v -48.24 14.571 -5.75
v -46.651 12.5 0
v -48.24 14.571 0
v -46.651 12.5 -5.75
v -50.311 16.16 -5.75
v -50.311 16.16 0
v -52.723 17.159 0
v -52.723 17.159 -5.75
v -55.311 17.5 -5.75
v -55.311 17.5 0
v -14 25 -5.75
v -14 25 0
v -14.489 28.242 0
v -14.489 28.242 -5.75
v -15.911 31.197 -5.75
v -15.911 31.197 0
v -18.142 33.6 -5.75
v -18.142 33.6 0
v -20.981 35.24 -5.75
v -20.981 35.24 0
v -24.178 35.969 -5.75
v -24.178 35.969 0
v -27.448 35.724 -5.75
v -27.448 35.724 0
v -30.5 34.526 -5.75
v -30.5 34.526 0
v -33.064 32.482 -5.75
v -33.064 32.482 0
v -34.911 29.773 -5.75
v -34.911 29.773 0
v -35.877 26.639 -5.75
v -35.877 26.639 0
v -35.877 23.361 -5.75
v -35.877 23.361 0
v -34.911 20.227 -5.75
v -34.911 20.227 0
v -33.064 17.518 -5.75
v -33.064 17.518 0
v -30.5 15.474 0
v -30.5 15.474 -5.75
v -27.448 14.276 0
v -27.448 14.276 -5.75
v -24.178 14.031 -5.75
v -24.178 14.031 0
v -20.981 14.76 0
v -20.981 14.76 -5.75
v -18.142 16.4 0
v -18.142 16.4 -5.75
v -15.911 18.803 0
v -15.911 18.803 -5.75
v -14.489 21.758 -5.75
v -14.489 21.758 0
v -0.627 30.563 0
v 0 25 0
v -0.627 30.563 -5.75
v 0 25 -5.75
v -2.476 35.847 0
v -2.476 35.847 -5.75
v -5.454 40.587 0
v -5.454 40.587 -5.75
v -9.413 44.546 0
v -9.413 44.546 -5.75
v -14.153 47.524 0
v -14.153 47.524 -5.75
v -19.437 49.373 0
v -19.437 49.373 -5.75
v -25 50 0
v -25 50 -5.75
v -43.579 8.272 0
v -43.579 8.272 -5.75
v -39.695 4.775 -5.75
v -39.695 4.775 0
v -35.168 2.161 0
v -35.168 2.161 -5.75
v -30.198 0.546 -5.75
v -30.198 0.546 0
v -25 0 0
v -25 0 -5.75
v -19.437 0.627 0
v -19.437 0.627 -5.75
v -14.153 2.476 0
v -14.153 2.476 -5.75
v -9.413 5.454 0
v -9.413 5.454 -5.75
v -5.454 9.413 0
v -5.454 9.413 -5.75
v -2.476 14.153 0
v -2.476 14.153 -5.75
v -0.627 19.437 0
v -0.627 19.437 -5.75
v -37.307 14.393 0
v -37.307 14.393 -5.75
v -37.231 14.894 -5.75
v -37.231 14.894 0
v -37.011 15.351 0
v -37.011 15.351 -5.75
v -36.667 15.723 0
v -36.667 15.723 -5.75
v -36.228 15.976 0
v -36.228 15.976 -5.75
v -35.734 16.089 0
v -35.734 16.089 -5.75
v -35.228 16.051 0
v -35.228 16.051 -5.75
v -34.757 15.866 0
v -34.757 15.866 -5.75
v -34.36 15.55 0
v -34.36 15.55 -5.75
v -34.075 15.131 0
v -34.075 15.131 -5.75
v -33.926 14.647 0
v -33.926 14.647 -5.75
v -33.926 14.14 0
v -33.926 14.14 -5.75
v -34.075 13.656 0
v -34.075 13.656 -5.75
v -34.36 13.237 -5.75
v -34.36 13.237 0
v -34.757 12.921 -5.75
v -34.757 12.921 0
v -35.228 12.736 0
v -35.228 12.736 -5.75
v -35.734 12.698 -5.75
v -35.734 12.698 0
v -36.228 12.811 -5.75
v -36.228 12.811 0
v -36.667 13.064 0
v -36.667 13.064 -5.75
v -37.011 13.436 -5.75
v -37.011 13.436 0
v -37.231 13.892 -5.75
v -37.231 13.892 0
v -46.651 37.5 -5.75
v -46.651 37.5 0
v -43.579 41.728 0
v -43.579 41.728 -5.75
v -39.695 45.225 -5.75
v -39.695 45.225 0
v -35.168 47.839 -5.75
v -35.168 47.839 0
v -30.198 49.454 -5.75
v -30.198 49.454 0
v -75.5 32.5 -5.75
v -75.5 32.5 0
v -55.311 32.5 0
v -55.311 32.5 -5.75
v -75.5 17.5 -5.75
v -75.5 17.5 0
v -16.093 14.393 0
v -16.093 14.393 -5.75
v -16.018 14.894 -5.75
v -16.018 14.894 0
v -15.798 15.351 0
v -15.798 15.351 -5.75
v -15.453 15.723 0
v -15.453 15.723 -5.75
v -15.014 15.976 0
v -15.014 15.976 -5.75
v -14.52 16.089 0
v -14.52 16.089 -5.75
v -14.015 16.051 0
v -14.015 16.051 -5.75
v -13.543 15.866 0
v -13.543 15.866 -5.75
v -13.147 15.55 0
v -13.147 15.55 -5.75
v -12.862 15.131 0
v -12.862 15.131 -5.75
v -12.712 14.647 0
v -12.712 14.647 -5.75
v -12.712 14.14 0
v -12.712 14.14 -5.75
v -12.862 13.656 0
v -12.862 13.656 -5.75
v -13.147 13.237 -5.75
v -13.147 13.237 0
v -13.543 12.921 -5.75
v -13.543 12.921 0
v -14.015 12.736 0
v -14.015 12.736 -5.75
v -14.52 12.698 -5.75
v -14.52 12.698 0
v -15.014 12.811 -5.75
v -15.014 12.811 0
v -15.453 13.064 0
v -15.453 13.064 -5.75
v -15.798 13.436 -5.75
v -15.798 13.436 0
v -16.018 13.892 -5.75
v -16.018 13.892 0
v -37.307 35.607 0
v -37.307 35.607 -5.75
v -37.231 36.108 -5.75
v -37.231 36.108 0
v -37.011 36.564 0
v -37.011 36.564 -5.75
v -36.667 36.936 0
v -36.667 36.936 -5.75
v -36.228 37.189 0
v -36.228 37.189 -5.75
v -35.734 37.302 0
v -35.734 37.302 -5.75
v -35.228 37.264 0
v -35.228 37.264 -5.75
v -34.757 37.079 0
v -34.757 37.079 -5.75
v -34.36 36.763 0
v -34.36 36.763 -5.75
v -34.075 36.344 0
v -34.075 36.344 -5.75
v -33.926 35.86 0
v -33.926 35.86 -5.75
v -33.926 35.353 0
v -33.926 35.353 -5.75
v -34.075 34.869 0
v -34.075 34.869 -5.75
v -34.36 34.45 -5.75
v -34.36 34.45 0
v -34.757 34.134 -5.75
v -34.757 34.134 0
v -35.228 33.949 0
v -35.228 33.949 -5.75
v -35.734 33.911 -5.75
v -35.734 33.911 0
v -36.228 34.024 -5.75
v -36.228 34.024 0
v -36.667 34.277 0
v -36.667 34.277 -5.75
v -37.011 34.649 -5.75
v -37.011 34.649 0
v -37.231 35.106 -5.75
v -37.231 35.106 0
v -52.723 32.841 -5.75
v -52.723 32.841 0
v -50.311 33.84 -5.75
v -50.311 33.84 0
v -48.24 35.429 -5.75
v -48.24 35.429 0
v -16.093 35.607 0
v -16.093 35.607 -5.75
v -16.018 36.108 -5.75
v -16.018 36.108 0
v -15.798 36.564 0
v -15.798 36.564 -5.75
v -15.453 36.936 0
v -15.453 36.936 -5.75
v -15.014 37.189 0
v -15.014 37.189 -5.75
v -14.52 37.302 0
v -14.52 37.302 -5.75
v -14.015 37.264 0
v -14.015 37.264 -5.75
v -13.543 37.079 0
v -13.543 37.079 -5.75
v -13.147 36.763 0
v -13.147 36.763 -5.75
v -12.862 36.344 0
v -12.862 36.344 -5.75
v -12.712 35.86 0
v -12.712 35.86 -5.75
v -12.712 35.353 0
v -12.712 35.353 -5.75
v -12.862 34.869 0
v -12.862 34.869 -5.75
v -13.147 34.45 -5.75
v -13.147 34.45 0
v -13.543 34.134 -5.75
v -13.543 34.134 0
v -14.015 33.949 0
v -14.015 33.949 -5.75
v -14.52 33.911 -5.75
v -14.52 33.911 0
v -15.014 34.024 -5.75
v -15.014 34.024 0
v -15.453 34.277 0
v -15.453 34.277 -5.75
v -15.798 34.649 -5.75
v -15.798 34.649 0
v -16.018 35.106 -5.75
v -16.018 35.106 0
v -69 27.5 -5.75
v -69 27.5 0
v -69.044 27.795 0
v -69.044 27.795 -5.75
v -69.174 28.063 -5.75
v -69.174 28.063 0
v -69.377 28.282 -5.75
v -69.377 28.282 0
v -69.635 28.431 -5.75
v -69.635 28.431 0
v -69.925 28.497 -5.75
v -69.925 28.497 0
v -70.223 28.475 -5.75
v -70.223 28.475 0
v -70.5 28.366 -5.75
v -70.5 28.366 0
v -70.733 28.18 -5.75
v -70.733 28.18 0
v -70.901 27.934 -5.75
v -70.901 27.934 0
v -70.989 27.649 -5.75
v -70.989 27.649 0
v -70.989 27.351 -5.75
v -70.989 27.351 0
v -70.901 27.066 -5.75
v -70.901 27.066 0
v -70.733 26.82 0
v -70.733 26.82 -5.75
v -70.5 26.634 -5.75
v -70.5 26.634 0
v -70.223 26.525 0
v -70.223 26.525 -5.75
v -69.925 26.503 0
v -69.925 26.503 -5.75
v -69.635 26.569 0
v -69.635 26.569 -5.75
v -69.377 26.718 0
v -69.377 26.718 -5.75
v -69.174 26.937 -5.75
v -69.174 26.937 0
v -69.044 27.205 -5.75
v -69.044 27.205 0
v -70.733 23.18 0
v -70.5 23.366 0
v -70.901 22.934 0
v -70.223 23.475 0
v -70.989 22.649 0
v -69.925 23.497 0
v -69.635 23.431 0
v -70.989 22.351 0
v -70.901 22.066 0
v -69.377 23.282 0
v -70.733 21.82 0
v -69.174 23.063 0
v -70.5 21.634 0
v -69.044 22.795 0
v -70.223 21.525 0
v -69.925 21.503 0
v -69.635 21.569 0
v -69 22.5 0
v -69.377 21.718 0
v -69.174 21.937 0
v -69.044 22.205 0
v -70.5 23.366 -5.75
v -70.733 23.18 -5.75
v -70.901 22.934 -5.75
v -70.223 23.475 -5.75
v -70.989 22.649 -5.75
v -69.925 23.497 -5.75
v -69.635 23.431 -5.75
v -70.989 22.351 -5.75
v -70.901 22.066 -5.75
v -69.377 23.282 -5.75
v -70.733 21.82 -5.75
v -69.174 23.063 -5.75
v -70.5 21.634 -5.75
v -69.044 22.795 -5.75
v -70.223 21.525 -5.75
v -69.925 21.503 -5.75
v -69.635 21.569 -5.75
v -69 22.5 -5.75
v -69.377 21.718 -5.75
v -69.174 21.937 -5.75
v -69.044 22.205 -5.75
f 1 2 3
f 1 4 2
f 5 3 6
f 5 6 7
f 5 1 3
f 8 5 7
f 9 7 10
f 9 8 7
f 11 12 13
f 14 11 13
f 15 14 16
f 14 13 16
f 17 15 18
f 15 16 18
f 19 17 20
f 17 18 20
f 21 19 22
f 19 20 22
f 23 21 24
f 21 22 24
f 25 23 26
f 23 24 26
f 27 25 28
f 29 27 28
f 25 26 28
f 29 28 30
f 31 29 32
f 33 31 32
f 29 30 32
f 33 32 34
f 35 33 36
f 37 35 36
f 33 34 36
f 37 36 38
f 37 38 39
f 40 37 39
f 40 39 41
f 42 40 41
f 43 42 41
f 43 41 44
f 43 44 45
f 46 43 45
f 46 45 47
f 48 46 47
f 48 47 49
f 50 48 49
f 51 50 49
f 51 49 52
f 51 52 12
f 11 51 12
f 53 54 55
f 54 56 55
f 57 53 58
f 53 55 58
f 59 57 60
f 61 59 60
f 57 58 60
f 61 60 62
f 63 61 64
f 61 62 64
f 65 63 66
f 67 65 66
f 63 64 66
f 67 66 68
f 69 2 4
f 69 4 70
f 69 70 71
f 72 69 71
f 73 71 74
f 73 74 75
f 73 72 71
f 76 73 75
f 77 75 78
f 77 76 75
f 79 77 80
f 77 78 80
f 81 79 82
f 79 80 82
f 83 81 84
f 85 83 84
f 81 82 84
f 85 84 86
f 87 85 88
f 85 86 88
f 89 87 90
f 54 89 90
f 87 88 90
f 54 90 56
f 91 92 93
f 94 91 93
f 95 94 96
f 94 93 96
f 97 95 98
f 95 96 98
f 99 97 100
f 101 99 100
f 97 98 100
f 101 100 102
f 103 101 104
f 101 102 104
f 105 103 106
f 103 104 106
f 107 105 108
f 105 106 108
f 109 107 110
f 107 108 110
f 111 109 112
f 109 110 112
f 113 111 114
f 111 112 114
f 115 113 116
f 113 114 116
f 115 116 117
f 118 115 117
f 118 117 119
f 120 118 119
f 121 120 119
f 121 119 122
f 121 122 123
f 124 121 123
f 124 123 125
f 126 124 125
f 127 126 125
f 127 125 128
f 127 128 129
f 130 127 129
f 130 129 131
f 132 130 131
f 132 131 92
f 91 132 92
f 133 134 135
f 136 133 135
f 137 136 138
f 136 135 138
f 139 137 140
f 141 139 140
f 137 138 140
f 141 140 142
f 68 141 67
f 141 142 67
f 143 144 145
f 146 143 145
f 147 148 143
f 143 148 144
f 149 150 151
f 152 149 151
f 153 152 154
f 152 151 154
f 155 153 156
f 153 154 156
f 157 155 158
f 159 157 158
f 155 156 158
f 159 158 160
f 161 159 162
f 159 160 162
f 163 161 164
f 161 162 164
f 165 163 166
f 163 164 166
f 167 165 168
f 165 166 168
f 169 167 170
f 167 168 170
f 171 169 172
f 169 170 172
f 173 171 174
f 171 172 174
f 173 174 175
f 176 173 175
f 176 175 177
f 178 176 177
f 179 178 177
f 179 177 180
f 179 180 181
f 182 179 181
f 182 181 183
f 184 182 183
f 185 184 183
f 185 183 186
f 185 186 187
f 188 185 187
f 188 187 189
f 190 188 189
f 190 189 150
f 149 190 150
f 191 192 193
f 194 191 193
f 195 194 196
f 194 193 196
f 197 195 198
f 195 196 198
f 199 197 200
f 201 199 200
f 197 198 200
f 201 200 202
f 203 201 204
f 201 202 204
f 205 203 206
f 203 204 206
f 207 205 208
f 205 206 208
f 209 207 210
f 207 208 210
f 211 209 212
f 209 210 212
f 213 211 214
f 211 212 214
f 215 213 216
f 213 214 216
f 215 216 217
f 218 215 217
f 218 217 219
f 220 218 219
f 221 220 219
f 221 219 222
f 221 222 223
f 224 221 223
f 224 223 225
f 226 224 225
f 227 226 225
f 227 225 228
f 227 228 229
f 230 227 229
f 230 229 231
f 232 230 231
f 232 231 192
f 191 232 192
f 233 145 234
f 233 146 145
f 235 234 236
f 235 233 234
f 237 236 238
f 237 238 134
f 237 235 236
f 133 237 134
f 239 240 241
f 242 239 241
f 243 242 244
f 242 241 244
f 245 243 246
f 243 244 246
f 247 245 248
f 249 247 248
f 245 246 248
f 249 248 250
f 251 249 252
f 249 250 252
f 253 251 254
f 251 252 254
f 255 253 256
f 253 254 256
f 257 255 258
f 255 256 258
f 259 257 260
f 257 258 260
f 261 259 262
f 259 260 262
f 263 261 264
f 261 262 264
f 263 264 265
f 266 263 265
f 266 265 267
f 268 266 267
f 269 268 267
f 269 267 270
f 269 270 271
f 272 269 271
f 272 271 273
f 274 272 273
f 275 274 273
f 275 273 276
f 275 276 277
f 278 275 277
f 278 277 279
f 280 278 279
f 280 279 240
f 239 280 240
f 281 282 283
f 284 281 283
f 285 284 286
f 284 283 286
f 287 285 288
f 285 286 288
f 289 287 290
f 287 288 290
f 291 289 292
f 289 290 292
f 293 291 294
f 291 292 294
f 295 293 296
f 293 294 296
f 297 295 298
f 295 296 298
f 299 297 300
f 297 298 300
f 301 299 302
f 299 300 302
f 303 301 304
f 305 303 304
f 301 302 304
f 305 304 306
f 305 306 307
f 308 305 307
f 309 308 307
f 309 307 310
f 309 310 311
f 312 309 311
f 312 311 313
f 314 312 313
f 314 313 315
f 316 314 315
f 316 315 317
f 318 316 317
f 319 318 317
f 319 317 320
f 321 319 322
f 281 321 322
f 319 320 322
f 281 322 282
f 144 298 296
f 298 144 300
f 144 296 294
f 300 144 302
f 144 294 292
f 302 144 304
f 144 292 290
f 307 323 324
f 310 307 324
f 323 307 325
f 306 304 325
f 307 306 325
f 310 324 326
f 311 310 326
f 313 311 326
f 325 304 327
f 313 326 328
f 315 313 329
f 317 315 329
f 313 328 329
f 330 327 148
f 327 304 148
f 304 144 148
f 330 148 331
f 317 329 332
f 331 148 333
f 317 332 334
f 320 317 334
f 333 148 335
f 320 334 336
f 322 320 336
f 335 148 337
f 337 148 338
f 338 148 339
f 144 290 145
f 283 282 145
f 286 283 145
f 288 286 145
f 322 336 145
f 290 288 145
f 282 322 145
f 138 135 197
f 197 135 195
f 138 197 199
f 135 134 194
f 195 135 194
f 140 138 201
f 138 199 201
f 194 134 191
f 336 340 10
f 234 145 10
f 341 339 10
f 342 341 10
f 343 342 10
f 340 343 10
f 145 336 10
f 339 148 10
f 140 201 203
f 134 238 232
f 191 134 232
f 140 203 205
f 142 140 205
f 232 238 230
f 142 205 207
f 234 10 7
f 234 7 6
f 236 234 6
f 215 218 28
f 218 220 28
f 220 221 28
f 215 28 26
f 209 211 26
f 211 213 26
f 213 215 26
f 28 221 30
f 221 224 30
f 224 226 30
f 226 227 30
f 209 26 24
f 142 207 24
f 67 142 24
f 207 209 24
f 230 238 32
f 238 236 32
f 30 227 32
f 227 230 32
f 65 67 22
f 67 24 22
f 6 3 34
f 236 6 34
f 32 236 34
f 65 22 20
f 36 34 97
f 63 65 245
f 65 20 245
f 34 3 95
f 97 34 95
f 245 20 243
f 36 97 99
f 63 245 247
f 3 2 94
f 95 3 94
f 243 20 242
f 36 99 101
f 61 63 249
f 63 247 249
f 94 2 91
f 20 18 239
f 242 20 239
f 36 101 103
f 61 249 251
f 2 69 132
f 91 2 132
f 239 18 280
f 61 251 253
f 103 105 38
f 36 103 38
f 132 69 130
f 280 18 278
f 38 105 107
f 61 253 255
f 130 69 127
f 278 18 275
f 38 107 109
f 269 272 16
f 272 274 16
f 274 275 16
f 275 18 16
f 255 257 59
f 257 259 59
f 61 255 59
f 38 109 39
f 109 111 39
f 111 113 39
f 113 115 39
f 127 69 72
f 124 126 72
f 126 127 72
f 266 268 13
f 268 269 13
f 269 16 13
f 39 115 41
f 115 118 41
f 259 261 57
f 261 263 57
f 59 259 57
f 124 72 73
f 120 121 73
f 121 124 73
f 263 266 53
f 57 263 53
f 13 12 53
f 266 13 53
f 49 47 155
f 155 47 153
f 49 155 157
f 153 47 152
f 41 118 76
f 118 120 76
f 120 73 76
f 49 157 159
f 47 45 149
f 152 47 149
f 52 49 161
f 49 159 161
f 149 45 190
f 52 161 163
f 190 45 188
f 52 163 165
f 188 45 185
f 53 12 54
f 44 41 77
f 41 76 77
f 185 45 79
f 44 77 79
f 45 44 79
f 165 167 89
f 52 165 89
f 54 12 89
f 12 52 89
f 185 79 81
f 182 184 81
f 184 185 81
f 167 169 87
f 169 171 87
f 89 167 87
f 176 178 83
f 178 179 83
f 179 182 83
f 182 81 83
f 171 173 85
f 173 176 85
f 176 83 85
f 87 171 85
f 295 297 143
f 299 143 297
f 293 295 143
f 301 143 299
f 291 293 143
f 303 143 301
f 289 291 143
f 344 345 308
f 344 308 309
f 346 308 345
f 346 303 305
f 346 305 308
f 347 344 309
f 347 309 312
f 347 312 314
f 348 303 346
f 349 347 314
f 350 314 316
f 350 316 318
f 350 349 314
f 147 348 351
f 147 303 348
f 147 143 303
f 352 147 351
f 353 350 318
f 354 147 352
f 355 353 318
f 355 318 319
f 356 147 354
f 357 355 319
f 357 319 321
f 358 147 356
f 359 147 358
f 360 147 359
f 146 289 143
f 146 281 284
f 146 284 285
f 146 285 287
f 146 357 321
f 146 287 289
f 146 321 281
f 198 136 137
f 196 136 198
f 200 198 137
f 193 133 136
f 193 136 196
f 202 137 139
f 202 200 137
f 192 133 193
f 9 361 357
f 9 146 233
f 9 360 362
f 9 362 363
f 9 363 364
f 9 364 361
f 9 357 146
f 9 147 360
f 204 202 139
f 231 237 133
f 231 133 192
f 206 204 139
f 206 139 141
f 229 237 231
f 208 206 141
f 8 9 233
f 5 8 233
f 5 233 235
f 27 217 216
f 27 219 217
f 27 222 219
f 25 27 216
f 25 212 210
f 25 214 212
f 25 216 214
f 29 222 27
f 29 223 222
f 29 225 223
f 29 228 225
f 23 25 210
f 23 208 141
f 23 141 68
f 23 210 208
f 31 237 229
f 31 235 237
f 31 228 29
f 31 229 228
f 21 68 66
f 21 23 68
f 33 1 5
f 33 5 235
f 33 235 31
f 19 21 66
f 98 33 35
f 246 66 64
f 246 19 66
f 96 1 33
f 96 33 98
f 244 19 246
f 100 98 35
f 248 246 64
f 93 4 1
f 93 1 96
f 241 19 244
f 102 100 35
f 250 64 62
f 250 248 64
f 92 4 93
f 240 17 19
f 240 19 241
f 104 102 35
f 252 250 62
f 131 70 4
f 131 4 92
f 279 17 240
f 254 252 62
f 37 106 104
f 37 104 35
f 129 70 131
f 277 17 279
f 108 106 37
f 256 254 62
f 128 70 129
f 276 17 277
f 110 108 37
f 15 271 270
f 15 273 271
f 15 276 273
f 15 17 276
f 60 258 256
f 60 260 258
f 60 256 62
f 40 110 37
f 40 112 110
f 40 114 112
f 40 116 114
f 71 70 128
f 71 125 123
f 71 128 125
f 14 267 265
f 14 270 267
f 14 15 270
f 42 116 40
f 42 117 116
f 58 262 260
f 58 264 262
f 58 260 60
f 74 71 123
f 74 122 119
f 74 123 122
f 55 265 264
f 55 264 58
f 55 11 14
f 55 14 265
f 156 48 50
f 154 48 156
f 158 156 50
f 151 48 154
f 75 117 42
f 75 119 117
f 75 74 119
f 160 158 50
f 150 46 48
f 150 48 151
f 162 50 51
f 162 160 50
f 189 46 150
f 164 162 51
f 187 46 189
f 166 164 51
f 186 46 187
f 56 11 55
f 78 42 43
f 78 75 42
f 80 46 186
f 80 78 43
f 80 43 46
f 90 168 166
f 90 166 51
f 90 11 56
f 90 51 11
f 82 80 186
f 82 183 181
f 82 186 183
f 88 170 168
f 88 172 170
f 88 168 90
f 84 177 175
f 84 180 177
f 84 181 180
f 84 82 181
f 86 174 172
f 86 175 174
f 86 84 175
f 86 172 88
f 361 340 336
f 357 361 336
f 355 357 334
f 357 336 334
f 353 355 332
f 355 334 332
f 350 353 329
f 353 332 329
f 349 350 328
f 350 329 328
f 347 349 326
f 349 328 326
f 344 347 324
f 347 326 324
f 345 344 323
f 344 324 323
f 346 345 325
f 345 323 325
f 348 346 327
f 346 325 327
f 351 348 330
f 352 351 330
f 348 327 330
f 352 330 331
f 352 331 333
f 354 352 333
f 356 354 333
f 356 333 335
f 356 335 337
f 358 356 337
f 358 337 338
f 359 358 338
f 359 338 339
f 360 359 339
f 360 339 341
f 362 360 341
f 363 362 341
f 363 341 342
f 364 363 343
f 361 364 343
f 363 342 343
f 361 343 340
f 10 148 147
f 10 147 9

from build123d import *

# Parameters (mm, degrees)
SKETCH2_W            = 100
SKETCH2_H            = 5.75
BOSS_EXTRUDE1_DEPTH  = 50
SKETCH4_R            = 11
CUT_EXTRUDE1_DEPTH   = 112.951161227
M3_CLEARANCE_HOLE2_D = 3.4
CUT_EXTRUDE3_DEPTH   = 5.75
FILLET1_R            = 25
FILLET2_R            = 10
M3_CLEARANCE_HOLE3_D = 3.4
SKETCH12_R           = 1
SKETCH12_W           = 24.5
SKETCH12_H           = 15
CUT_EXTRUDE4_DEPTH   = 5.75


with BuildPart() as part:
    # Sketch2 → Boss-Extrude1 (new body)
    with BuildSketch(Plane(origin=(0, 0, 0), x_dir=(1, 0, 0), z_dir=(0, 1, 0))):
        with Locations((-50, 2.875)):
            Rectangle(SKETCH2_W, SKETCH2_H)
    extrude(amount=BOSS_EXTRUDE1_DEPTH)

    # Sketch4 → Cut-Extrude1 (cut, through all)
    with BuildSketch(Plane.XY):
        with Locations((-25, 25)):
            Circle(SKETCH4_R)
    extrude(amount=-CUT_EXTRUDE1_DEPTH, mode=Mode.SUBTRACT)

    # M3 Clearance Hole2 (through all)
    with Locations(Plane.XY):
        with Locations((-35.606601718, 14.393398282), (-35.606601718, 35.606601718), (-14.393398282, 35.606601718), (-14.393398282, 14.393398282)):
            Hole(M3_CLEARANCE_HOLE2_D / 2)

    # Sketch9 → Cut-Extrude3 (cut)
    with BuildSketch(Plane.XY):
        with BuildLine():
            Line((-25, 50), (-100, 50))
            Line((-100, 50), (-100, 32.5))
            Line((-100, 32.5), (-48.848480035, 32.5))
            ThreePointArc((-48.848480035, 32.5), (-39.790199458, 45.155644371), (-25, 50))
        make_face()
        with BuildLine():
            Line((-25, 0), (-100, 0))
            Line((-100, 0), (-100, 17.5))
            Line((-100, 17.5), (-48.848480035, 17.5))
            ThreePointArc((-48.848480035, 17.5), (-39.790199458, 4.844355629), (-25, 0))
        make_face()
    extrude(amount=-CUT_EXTRUDE3_DEPTH, mode=Mode.SUBTRACT)

    # Fillet1
    fillet1_edges = [part.edges().sort_by_distance(p)[0] for p in [
        (0, 0, -2.875),
        (0, 50, -2.875),
    ]]
    fillet(fillet1_edges, radius=FILLET1_R - 0.0001)  # a hair under: the kernel refuses the full size

    # Fillet2
    fillet2_edges = [part.edges().sort_by_distance(p)[0] for p in [
        (-48.848480035, 32.5, -2.875),
        (-48.848480035, 17.5, -2.875),
    ]]
    fillet(fillet2_edges, radius=FILLET2_R)

    # M3 Clearance Hole3 (through all)
    with Locations(Plane.XY):
        with Locations((-94, 28.5), (-94, 21.5)):
            Hole(M3_CLEARANCE_HOLE3_D / 2)

    # Sketch12 → Cut-Extrude4 (cut)
    with BuildSketch(Plane.XY):
        with Locations((-70, 27.5)):
            Circle(SKETCH12_R)
        with Locations((-70, 22.5)):
            Circle(SKETCH12_R)
        with Locations((-87.75, 25)):
            Rectangle(SKETCH12_W, SKETCH12_H)
    extrude(amount=-CUT_EXTRUDE4_DEPTH, mode=Mode.SUBTRACT)


solid = part.part
